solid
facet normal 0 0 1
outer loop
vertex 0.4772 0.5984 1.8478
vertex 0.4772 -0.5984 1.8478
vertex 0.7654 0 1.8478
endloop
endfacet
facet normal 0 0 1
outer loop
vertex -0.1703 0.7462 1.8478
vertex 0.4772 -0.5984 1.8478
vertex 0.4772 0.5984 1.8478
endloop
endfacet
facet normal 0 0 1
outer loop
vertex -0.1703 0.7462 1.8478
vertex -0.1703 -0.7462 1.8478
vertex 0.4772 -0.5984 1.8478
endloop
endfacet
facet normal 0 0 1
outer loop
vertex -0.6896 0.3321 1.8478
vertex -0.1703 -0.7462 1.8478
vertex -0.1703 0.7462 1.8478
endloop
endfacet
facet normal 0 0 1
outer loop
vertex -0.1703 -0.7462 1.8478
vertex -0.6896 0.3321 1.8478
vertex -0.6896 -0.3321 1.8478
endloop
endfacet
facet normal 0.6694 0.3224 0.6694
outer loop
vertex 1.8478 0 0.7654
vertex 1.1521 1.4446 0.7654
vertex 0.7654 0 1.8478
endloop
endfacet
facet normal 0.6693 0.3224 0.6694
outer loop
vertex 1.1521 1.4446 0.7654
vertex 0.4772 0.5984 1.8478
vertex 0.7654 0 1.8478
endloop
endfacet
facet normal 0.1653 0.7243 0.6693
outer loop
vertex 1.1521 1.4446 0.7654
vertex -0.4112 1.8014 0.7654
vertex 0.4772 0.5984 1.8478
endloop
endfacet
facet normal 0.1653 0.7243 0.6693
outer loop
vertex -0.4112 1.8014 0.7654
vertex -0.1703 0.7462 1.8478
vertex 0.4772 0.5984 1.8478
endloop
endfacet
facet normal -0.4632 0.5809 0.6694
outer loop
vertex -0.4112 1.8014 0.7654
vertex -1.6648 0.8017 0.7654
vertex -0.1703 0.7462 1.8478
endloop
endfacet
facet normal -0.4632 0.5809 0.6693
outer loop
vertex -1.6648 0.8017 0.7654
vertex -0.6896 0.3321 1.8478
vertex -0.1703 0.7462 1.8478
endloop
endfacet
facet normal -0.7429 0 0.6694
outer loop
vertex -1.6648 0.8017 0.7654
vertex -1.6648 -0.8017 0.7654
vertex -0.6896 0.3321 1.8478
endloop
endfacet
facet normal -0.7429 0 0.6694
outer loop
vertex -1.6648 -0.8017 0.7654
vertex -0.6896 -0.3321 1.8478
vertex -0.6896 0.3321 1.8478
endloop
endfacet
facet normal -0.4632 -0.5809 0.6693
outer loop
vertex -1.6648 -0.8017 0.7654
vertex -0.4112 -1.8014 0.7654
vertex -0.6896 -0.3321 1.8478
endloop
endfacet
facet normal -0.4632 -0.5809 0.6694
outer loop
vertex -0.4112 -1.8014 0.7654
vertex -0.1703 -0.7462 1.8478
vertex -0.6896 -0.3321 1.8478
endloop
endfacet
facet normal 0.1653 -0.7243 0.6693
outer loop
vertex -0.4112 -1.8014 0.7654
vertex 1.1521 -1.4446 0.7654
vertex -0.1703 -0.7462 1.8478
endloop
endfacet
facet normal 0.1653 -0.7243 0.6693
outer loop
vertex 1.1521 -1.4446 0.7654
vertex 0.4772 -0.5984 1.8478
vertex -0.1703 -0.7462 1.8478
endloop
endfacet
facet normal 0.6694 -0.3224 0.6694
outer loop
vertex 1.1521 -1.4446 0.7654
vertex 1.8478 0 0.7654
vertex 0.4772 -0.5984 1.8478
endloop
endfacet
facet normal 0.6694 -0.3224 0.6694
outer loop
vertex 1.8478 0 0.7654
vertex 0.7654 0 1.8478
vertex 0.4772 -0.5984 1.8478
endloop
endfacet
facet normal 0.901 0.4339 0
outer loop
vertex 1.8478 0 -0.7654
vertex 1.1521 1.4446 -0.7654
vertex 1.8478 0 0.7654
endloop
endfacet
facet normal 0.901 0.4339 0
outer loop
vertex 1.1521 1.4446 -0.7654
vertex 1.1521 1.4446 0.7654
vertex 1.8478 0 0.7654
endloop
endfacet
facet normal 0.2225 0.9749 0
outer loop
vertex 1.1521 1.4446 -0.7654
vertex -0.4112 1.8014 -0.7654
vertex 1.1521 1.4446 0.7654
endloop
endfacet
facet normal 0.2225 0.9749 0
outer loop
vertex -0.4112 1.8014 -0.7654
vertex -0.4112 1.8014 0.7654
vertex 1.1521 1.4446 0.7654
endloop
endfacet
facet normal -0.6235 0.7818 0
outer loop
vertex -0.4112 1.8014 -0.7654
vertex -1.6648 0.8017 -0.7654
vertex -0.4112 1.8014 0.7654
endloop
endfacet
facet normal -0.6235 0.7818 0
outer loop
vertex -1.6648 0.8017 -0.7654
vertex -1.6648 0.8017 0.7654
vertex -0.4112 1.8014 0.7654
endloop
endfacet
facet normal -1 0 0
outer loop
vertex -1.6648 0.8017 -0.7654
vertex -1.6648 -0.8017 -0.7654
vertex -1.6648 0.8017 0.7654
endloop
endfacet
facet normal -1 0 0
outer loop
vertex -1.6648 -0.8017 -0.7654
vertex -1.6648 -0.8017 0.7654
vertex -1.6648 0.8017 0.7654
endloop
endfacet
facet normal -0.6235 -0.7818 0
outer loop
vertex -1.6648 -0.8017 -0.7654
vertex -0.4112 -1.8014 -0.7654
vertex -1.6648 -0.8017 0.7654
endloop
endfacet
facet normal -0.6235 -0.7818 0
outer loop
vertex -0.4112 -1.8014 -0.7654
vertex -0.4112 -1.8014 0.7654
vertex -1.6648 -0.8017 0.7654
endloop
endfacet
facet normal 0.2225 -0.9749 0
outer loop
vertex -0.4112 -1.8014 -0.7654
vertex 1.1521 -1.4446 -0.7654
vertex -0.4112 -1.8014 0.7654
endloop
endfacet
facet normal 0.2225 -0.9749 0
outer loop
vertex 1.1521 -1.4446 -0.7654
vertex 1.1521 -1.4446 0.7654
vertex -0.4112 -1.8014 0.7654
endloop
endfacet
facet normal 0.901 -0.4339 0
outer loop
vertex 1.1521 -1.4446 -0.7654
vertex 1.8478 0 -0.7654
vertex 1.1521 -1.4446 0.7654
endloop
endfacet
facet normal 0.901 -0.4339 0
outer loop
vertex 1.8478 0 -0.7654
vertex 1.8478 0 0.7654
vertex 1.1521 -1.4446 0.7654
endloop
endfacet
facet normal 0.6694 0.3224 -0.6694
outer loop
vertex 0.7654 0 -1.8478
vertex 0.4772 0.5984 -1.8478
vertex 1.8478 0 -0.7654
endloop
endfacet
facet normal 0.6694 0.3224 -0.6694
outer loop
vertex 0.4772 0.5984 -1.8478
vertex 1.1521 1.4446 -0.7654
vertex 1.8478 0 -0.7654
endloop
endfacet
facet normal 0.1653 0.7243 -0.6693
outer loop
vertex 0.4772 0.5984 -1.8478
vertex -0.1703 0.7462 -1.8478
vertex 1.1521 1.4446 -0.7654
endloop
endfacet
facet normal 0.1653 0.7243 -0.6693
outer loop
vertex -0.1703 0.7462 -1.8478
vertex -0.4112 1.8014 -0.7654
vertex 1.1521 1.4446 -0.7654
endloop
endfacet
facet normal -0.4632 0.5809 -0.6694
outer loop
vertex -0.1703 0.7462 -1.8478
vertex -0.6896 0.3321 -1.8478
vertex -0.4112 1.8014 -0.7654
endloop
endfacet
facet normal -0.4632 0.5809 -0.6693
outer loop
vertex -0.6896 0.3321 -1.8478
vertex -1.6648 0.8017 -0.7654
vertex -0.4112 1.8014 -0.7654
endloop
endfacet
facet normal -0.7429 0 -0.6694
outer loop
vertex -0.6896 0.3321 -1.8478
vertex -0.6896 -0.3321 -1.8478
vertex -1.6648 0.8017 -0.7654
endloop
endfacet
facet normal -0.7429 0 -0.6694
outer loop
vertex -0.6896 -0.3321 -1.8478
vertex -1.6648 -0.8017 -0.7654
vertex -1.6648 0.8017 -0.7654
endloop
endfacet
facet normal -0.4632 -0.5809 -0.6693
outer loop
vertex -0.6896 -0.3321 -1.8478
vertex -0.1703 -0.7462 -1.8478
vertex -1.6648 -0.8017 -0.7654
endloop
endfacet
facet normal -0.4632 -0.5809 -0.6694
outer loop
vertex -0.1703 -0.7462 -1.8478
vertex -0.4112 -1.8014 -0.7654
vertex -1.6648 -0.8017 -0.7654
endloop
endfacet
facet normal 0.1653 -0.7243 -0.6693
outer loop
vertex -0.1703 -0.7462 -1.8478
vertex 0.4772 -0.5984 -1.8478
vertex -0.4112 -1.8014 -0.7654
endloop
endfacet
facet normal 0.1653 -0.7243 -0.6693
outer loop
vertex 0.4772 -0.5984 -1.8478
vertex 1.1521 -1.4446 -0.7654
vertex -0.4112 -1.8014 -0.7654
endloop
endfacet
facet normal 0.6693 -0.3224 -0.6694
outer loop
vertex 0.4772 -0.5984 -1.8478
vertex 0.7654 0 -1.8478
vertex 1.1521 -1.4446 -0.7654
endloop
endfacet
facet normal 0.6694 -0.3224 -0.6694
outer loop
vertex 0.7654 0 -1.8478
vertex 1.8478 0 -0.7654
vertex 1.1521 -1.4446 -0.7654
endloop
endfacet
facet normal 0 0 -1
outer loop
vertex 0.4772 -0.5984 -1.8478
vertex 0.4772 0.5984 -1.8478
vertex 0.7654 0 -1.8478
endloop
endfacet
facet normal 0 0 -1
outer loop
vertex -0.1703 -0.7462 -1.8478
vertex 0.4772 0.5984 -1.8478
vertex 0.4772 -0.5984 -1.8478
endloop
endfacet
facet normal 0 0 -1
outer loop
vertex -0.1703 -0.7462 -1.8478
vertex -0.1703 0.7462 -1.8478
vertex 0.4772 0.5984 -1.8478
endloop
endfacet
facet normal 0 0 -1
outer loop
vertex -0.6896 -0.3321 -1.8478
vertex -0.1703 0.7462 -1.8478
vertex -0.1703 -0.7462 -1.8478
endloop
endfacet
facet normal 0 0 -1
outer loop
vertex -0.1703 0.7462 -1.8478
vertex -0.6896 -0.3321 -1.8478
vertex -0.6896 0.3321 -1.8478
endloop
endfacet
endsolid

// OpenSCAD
/*
<json>
    {
        "Name": "Test Param 1",
        "Desc": "Use the slider to indicate how many columns printed acceptably.",
        "LowKeyword": "Lost",
        "HighKeyword": "Printed",
        "varBase": "TestParam1",
        "minDefault": 0.1,
        "maxDefault": 2,
        "minDefaultND": "0.5 * nozzleDiameter",
        "maxDefaultND": "5 * nozzleDiameter",
        "cameraData": "9.57,-17.9,8.45,57.8,0,314.8,85",
        "sortOrder": 0,
		"instanceCount": 10
    }
</json>
*/

sphere(d=4);

/*
<json>
    {
        "Name": "Test Param 2",
        "Desc": "Use the slider to indicate how many columns printed acceptably.",
        "LowKeyword": "Lost",
        "HighKeyword": "Printed",
        "varBase": "TestParam2",
        "minDefault": 0.1,
        "maxDefault": 2,
        "minDefaultND": "0.5 * nozzleDiameter",
        "maxDefaultND": "5 * nozzleDiameter",
        "cameraData": "9.57,-17.9,8.45,57.8,0,314.8,85",
        "sortOrder": 1,
		"instanceCount": 10
    }
</json>
*/
